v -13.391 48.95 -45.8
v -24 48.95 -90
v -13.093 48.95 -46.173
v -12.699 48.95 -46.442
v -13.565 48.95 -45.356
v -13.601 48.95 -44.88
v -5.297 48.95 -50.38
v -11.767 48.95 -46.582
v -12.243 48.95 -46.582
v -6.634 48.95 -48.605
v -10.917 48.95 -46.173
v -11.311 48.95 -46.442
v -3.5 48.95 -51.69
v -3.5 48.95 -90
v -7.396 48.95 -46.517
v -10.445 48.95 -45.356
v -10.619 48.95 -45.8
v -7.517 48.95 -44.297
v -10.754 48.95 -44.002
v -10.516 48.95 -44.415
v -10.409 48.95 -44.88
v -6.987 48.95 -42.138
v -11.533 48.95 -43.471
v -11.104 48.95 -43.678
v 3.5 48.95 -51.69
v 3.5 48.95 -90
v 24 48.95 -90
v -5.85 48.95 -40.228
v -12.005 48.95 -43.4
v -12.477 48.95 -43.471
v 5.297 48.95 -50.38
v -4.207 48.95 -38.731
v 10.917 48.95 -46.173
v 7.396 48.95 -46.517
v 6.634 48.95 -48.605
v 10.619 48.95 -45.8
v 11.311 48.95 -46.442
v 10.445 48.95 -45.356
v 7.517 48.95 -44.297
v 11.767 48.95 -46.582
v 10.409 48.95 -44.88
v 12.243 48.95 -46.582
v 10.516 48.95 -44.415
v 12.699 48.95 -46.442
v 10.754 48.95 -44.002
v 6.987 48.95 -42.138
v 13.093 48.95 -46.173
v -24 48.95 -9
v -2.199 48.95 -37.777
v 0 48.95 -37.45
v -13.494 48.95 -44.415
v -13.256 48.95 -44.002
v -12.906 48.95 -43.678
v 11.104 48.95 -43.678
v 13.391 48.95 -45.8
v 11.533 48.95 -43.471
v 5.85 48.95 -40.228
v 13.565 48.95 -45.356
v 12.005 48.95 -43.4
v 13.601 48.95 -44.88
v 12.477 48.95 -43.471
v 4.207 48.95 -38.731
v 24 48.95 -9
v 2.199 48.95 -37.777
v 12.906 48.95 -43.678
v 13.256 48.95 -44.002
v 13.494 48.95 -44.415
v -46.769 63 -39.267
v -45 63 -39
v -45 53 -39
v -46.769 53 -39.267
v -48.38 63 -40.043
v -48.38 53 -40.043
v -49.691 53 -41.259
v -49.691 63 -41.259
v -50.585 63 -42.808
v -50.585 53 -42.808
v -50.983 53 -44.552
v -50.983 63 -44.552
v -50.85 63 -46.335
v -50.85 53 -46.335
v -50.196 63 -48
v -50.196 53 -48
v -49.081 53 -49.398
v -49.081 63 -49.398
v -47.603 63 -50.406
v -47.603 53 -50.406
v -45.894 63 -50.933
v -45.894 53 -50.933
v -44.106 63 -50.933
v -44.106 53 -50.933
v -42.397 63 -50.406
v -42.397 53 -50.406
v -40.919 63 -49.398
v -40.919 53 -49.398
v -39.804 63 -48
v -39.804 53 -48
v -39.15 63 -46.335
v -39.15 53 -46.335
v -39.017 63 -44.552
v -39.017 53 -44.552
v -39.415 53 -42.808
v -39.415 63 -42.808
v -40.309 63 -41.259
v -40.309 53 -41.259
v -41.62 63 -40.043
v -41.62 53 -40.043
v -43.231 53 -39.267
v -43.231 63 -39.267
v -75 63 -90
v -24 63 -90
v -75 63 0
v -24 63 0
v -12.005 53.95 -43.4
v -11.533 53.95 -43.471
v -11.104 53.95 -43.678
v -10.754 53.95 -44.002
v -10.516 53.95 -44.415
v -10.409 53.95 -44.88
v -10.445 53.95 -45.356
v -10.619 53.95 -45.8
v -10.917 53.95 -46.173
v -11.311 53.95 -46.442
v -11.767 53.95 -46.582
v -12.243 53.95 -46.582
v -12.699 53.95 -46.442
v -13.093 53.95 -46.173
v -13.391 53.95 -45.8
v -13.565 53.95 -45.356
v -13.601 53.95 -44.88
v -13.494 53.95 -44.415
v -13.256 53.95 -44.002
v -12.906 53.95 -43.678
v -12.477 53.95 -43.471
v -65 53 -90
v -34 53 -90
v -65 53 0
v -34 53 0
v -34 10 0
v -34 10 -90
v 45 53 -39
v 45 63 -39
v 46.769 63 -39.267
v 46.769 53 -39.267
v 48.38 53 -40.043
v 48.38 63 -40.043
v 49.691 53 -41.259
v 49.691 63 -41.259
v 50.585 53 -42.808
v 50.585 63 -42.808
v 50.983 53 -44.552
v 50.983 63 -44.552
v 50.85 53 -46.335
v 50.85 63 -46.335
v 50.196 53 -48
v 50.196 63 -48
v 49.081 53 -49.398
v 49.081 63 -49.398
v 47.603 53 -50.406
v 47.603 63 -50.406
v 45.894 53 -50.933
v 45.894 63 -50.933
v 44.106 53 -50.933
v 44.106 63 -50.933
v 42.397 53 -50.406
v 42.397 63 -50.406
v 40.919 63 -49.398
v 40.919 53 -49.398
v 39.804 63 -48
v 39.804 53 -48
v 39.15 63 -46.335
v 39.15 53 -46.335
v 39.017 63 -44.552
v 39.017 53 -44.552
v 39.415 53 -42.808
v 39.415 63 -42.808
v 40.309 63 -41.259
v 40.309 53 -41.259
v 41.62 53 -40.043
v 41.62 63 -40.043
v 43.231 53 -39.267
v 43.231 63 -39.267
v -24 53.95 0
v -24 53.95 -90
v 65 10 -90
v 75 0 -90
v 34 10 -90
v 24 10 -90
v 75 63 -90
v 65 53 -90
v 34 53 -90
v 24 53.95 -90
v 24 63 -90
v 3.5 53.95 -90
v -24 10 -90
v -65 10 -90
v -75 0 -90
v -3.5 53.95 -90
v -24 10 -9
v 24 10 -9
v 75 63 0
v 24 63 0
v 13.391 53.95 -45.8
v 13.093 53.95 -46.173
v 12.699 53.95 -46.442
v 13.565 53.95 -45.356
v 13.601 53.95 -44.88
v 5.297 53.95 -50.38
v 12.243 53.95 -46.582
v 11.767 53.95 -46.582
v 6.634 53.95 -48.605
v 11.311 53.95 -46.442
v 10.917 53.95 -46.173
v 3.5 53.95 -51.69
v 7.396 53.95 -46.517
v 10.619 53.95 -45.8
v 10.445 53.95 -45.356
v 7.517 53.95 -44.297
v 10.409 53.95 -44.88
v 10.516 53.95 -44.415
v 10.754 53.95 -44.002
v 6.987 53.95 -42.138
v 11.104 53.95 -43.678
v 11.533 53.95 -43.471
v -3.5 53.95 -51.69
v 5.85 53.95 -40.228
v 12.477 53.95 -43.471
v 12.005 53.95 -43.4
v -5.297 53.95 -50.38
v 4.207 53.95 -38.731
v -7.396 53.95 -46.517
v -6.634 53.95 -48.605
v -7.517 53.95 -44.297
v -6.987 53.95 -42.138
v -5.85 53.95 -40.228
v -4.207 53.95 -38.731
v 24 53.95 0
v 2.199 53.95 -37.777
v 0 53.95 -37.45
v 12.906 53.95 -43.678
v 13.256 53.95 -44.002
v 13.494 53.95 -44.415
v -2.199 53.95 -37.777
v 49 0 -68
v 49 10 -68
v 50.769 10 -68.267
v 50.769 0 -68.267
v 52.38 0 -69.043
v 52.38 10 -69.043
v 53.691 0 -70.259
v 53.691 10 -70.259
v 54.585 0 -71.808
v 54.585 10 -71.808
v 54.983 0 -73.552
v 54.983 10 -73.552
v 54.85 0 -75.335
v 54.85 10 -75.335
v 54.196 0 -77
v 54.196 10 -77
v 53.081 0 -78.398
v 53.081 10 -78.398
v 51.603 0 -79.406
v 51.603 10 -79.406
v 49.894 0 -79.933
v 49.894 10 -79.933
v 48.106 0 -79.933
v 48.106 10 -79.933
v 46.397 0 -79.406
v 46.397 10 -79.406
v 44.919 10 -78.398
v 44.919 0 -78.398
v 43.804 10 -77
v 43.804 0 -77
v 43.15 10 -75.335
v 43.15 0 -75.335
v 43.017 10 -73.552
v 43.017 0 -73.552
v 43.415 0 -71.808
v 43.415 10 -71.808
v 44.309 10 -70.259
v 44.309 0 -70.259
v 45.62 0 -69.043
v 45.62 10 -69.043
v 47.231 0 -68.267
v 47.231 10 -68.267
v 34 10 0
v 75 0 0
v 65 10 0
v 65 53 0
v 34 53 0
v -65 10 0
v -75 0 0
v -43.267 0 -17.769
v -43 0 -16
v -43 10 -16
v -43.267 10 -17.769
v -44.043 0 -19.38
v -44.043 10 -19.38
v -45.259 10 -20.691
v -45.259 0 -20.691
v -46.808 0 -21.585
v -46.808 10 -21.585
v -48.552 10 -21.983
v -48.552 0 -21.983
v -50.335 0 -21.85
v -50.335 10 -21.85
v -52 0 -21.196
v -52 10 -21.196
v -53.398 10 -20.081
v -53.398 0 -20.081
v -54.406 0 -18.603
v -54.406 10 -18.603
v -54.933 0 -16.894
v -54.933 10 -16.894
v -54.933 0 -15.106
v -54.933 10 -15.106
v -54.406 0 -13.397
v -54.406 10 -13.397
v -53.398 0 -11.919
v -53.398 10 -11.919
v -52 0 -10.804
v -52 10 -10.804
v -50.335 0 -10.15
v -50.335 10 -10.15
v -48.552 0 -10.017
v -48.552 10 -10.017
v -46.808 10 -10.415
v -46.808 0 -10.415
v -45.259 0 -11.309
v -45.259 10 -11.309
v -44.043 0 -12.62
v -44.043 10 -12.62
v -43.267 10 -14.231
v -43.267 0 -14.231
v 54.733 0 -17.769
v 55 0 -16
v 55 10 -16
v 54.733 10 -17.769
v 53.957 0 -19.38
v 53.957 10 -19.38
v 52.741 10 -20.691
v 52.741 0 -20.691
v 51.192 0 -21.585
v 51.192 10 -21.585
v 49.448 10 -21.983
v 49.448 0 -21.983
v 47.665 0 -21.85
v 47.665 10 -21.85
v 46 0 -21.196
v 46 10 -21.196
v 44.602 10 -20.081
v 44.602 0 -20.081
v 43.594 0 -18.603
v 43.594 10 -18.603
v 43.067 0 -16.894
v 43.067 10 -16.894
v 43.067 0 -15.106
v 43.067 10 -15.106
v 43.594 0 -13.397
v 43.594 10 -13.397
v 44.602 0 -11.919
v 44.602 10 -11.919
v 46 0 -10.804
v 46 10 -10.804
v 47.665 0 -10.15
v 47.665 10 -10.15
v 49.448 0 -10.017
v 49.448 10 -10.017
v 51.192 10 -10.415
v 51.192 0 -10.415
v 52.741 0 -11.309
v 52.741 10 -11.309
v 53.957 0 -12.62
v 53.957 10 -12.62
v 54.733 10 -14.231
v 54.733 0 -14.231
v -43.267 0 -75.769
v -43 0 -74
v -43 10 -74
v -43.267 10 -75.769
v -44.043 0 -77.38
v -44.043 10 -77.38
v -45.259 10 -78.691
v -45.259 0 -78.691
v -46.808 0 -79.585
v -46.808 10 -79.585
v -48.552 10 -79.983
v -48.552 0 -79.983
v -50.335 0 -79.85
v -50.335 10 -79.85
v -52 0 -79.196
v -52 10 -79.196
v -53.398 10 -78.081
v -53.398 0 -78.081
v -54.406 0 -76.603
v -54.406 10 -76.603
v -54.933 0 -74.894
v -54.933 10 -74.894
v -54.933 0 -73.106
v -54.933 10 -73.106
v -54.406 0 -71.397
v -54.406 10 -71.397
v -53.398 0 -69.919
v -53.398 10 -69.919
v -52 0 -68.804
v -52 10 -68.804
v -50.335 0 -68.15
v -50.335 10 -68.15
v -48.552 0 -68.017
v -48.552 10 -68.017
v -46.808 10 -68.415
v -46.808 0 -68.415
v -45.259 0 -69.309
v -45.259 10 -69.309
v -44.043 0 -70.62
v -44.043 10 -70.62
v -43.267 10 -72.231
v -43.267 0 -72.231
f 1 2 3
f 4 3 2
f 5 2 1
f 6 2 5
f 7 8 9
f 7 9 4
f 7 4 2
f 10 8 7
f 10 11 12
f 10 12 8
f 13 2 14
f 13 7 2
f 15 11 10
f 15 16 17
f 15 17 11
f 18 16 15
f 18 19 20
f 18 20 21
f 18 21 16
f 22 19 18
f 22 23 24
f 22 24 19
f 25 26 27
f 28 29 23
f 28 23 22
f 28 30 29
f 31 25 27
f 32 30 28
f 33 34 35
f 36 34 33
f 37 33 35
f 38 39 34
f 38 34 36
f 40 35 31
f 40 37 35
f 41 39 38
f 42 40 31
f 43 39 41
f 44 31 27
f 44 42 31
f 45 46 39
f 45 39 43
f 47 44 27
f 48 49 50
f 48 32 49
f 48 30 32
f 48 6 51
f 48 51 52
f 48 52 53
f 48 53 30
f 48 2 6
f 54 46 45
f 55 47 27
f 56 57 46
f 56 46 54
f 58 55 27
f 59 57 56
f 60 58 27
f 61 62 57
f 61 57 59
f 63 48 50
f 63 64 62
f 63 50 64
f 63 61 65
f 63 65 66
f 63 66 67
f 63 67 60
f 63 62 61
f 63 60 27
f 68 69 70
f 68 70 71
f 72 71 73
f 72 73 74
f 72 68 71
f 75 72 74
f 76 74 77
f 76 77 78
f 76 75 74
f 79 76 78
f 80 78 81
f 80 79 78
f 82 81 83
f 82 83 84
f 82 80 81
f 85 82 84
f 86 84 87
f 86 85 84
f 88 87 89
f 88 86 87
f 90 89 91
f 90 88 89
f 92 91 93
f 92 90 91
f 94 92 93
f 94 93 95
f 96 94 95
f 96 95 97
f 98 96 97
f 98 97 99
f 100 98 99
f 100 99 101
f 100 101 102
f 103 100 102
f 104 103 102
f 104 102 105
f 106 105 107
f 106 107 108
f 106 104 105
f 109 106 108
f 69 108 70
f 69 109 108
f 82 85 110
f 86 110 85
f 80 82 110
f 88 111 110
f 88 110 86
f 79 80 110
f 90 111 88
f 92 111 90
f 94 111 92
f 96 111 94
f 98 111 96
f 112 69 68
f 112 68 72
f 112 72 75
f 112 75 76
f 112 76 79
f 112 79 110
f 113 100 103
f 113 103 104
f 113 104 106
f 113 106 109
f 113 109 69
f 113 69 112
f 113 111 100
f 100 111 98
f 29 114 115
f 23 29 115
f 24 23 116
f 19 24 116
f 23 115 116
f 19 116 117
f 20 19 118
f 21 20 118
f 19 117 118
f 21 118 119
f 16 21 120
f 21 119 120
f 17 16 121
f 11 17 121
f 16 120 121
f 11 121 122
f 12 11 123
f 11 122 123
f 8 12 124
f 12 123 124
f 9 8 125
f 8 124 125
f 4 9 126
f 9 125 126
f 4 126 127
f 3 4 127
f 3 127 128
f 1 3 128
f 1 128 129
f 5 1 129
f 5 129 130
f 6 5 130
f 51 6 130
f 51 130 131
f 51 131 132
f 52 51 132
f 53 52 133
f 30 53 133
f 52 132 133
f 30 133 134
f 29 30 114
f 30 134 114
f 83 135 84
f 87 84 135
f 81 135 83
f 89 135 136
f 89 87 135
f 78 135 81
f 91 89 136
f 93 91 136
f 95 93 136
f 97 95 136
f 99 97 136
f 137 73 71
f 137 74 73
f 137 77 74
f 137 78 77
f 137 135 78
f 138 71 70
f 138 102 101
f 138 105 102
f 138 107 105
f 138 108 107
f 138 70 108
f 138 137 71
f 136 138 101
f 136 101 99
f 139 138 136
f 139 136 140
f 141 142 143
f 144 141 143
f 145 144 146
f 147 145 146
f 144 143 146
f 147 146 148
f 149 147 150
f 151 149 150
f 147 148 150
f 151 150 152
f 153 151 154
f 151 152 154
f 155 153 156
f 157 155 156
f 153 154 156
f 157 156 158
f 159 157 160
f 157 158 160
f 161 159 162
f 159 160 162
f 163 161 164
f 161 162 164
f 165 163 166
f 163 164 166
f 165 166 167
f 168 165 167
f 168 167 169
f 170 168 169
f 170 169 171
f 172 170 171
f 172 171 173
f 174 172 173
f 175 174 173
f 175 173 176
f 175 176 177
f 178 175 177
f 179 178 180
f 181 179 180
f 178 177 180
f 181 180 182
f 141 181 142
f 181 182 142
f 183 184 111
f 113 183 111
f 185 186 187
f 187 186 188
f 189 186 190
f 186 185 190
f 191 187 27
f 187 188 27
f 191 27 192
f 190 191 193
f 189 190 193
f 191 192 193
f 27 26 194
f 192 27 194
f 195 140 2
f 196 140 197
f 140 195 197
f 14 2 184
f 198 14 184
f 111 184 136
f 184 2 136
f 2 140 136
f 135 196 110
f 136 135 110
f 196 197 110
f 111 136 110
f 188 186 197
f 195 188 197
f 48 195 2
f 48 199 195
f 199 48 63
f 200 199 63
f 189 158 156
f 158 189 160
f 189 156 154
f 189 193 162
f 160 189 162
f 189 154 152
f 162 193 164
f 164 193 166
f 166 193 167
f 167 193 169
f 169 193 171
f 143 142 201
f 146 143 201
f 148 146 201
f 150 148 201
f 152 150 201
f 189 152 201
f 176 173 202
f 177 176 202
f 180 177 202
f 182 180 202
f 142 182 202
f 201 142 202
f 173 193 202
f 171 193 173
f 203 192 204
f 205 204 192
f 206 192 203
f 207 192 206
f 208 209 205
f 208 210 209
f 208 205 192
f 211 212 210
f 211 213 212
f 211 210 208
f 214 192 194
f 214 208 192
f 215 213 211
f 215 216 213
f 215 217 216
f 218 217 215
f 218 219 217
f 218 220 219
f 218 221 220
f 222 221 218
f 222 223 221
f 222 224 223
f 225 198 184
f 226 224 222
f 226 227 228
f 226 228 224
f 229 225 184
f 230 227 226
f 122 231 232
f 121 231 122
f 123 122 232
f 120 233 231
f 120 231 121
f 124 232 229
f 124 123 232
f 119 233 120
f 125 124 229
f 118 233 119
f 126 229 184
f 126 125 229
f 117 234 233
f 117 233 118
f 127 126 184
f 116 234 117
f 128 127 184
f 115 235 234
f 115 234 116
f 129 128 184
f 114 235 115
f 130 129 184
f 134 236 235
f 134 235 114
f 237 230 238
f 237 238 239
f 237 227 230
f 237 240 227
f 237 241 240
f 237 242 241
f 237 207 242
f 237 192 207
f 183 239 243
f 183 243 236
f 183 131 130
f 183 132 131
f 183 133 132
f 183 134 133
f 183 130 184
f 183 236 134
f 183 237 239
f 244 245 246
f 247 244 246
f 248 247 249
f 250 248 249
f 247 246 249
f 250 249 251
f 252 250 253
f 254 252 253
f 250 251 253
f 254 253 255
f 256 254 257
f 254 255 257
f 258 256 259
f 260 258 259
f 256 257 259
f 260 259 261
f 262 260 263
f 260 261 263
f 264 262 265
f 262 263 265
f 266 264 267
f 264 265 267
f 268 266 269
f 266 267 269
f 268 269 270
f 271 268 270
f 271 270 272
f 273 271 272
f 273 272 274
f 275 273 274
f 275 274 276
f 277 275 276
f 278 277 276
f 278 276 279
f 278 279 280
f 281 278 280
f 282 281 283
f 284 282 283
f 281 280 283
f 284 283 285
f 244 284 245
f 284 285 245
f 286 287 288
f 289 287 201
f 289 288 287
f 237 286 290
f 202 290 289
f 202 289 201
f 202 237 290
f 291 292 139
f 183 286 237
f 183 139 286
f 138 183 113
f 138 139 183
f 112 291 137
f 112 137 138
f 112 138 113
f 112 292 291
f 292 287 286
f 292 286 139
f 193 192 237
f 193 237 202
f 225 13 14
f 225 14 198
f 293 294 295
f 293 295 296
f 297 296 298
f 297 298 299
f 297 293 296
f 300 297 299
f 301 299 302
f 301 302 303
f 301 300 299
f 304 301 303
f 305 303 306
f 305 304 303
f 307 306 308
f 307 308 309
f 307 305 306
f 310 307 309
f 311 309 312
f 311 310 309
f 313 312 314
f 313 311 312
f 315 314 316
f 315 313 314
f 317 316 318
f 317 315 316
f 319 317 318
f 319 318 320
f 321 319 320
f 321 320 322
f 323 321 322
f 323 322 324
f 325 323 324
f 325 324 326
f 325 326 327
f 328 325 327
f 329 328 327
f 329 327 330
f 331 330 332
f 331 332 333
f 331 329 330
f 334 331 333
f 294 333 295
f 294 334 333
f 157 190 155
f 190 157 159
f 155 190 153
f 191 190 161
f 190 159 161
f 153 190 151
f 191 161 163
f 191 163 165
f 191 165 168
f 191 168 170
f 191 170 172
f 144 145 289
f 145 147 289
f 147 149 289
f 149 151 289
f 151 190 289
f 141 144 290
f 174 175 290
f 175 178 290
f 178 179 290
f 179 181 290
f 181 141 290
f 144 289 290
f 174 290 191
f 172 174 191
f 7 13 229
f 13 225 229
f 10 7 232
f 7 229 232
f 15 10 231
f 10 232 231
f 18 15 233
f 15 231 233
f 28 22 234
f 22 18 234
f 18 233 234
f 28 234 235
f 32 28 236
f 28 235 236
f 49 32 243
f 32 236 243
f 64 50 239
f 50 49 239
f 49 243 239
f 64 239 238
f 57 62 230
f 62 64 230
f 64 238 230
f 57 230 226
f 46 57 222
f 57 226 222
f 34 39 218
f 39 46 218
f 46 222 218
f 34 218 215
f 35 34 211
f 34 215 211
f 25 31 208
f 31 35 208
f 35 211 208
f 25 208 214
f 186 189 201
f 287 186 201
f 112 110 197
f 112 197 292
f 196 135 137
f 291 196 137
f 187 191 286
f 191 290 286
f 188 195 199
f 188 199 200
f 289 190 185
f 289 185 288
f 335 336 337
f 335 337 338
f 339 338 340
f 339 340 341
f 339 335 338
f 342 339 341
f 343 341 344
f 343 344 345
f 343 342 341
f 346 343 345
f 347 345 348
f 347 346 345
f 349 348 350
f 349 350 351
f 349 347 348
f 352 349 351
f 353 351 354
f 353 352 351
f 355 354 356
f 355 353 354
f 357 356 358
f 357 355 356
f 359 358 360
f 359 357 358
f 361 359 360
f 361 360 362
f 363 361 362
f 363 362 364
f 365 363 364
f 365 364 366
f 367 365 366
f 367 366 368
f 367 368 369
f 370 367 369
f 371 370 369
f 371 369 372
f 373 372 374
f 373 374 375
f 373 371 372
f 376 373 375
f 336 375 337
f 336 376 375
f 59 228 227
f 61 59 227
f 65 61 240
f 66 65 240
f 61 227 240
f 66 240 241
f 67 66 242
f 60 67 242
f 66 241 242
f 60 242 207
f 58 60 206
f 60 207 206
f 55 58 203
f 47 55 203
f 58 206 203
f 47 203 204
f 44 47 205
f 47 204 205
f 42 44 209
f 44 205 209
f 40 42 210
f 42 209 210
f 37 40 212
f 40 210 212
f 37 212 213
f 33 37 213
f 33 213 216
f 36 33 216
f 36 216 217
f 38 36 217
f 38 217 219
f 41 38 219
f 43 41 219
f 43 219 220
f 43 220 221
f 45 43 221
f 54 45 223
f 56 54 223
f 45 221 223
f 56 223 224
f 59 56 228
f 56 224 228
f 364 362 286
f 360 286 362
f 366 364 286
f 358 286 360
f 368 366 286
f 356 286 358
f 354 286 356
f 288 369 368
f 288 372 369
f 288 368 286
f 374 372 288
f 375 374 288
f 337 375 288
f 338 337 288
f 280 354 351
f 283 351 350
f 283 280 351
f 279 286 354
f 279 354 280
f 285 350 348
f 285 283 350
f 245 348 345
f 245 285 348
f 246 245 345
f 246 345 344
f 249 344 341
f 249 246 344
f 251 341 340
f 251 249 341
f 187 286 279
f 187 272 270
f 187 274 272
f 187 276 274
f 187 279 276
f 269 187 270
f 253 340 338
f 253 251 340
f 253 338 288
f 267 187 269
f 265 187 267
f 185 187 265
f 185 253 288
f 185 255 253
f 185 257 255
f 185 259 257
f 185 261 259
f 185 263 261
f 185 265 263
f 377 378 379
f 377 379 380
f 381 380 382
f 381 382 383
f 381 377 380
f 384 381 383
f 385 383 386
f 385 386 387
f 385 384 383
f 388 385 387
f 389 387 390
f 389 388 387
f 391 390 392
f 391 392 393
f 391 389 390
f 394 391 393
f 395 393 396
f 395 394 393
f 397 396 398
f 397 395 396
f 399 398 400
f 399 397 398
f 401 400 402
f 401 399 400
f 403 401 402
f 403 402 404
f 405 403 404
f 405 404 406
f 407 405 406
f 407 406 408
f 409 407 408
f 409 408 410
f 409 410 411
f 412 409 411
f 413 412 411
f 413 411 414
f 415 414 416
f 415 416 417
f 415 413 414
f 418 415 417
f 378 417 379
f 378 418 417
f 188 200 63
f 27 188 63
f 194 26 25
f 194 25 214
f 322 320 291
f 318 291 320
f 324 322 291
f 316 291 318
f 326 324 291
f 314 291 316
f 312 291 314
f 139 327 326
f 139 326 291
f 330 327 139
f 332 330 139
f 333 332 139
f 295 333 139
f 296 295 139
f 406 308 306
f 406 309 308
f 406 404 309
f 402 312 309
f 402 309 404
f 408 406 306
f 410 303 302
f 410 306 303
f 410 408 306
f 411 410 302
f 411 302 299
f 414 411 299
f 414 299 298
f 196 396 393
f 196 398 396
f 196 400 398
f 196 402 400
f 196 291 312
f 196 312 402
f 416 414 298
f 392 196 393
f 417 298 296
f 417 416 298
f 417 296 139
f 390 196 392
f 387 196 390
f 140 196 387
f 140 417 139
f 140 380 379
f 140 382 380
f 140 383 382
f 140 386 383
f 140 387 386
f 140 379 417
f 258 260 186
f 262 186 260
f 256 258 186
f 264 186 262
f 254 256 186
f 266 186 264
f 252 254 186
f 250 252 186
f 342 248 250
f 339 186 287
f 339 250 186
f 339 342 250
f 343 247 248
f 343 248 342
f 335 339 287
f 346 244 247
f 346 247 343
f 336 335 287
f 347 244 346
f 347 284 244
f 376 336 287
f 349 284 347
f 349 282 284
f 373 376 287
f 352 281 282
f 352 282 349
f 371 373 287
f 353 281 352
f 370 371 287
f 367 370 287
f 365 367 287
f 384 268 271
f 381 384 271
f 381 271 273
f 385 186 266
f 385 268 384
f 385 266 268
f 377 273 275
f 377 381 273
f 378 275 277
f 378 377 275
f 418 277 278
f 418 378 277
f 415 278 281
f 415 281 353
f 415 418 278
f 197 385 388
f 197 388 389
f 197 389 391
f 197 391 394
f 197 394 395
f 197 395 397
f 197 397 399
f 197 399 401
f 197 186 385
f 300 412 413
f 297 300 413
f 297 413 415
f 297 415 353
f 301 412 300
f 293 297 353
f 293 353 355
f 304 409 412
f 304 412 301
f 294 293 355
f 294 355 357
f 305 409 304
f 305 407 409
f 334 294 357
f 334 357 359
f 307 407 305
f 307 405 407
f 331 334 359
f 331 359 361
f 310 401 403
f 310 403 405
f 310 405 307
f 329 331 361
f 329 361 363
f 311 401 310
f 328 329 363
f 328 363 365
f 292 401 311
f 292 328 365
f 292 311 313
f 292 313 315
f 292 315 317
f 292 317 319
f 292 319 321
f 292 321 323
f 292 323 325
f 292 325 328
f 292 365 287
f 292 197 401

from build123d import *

# Parameters (mm, degrees)
SKETCH2_W           = 130
SKETCH2_H           = 90
BOSS_EXTRUDE1_DEPTH = 10
SKETCH3_W           = 42
SKETCH3_H           = 72
BOSS_EXTRUDE3_DEPTH = 53
SKETCH4_W           = 32
SKETCH4_H           = 43
CUT_EXTRUDE1_DEPTH  = 72
SKETCH5_R           = 6
CUT_EXTRUDE2_DEPTH  = 10
SKETCH6_W           = 72
SKETCH6_H           = 5
BOSS_EXTRUDE4_DEPTH = 48
SKETCH7_R           = 7.55
SKETCH7_R_2         = 1.6
CUT_EXTRUDE3_DEPTH  = 5
SKETCH8_R           = 6
CUT_EXTRUDE4_DEPTH  = 10
MIRROR2_OUTLINE_R   = 6
MIRROR2_DEPTH       = 10
SKETCH9_W           = 68
SKETCH9_H           = 43.95
BOSS_EXTRUDE5_DEPTH = 9
SKETCH10_W          = 7
SKETCH10_H          = 36
CUT_EXTRUDE5_DEPTH  = 5
BOSS_EXTRUDE6_DEPTH = 9
BOSS_EXTRUDE7_DEPTH = 9
SKETCH13_W          = 90
SKETCH13_H          = 63
BOSS_EXTRUDE8_DEPTH = 10


# Read off the part's stored shape, not the designer's step: Mirror2
with BuildPart() as part:
    # Sketch2 → Boss-Extrude1 (new body)
    with BuildSketch(Plane(origin=(0, 0, 0), x_dir=(1, 0, 0), z_dir=(0, 1, 0))):
        with Locations((0, 45)):
            Rectangle(SKETCH2_W, SKETCH2_H)
    extrude(amount=BOSS_EXTRUDE1_DEPTH)

    # Sketch3 → Boss-Extrude3 (add)
    with BuildSketch(Plane(origin=(0, 10, 0), x_dir=(1, 0, 0), z_dir=(0, 1, 0))):
        with Locations((45, 45)):
            Rectangle(SKETCH3_W, SKETCH3_H)
    boss_extrude3 = extrude(amount=BOSS_EXTRUDE3_DEPTH)

    # Sketch4 → Cut-Extrude1 (cut)
    with BuildSketch(Plane.XY.offset(-9)):
        with Locations((50, 31.5)):
            Rectangle(SKETCH4_W, SKETCH4_H)
    cut_extrude1 = extrude(amount=-CUT_EXTRUDE1_DEPTH, mode=Mode.SUBTRACT)

    # Sketch5 → Cut-Extrude2 (cut)
    with BuildSketch(Plane(origin=(0, 63, 0), x_dir=(1, 0, 0), z_dir=(0, 1, 0))):
        with Locations(Location((45, 45, 0), (0, 0, 270))):
            Circle(SKETCH5_R)
    cut_extrude2 = extrude(amount=-CUT_EXTRUDE2_DEPTH, mode=Mode.SUBTRACT)

    # Mirror1: Boss-Extrude3, Cut-Extrude1, Cut-Extrude2 across Right Plane
    add(boss_extrude3.mirror(Plane(origin=(0, 0, 0), x_dir=(0, 0, -1), z_dir=(1, 0, 0))))
    add(cut_extrude1.mirror(Plane(origin=(0, 0, 0), x_dir=(0, 0, -1), z_dir=(1, 0, 0))), mode=Mode.SUBTRACT)
    add(cut_extrude2.mirror(Plane(origin=(0, 0, 0), x_dir=(0, 0, -1), z_dir=(1, 0, 0))), mode=Mode.SUBTRACT)

    # Sketch6 → Boss-Extrude4 (add)
    with BuildSketch(Plane.ZY.offset(-24)):
        with Locations((-45, 51.45)):
            Rectangle(SKETCH6_W, SKETCH6_H)
    extrude(amount=BOSS_EXTRUDE4_DEPTH)

    # Sketch7 → Cut-Extrude3 (cut)
    with BuildSketch(Plane(origin=(0, 53.95, 0), x_dir=(1, 0, 0), z_dir=(0, 1, 0))):
        with Locations(Location((0, 45, 0), (0, 0, 270))):
            Circle(SKETCH7_R)
        with Locations(Location((12.005, 45, 0), (0, 0, 270))):
            Circle(SKETCH7_R_2)
        with Locations(Location((-12.005, 45, 0), (0, 0, 270))):
            Circle(SKETCH7_R_2)
    extrude(amount=-CUT_EXTRUDE3_DEPTH, mode=Mode.SUBTRACT)

    # Sketch8 → Cut-Extrude4 (cut)
    with BuildSketch(Plane(origin=(0, 10, 0), x_dir=(1, 0, 0), z_dir=(0, 1, 0))):
        with Locations(Location((49, 74, 0), (0, 0, 270))):
            Circle(SKETCH8_R)
    extrude(amount=-CUT_EXTRUDE4_DEPTH, mode=Mode.SUBTRACT)

    # Mirror2 outline → Mirror2 (cut)
    with BuildSketch(Plane(origin=(0, 0, 0), x_dir=(1, 0, 0), z_dir=(0, 1, 0))):
        with Locations((49, 16)):
            Circle(MIRROR2_OUTLINE_R)
        with Locations((-49, 74)):
            Circle(MIRROR2_OUTLINE_R)
        with Locations((-49, 16)):
            Circle(MIRROR2_OUTLINE_R)
    extrude(amount=MIRROR2_DEPTH, mode=Mode.SUBTRACT)

    # Sketch9 → Boss-Extrude5 (add)
    with BuildSketch(Plane.XY.offset(-9)):
        with Locations((0, 31.975)):
            Rectangle(SKETCH9_W, SKETCH9_H)
    extrude(amount=BOSS_EXTRUDE5_DEPTH)

    # Sketch10 → Cut-Extrude5 (cut)
    with BuildSketch(Plane(origin=(0, 53.95, 0), x_dir=(1, 0, 0), z_dir=(0, 1, 0))):
        with Locations((0, 63)):
            Rectangle(SKETCH10_W, SKETCH10_H)
    extrude(amount=-CUT_EXTRUDE5_DEPTH, mode=Mode.SUBTRACT)

    # Sketch11 → Boss-Extrude6 (add)
    with BuildSketch(Plane.XY.offset(-9)):
        Polygon((-66, 63), (-66, 53), (-34, 53), (-34, 53.95), (-24, 53.95), (-24, 63), align=None)
    boss_extrude6 = extrude(amount=BOSS_EXTRUDE6_DEPTH)

    # Mirror3: Boss-Extrude6 across Right Plane
    add(boss_extrude6.mirror(Plane(origin=(0, 0, 0), x_dir=(0, 0, -1), z_dir=(1, 0, 0))))

    # Sketch12 → Boss-Extrude7 (add)
    with BuildSketch(Plane(origin=(0, 0, -81), x_dir=(-1, 0, 0), z_dir=(0, 0, -1))):
        Polygon((-66, 63), (-66, 53), (-34, 53), (-34, 10), (-24, 10), (-24, 48.95), (-3.5, 48.95), (-3.5, 53.95), (-24, 53.95), (-24, 63), align=None)
    boss_extrude7 = extrude(amount=BOSS_EXTRUDE7_DEPTH)

    # Mirror4: Boss-Extrude7 across Right Plane
    add(boss_extrude7.mirror(Plane(origin=(0, 0, 0), x_dir=(0, 0, -1), z_dir=(1, 0, 0))))

    # Sketch13 → Boss-Extrude8 (add)
    with BuildSketch(Plane.ZY.offset(65)):
        with Locations((-45, 31.5)):
            Rectangle(SKETCH13_W, SKETCH13_H)
    boss_extrude8 = extrude(amount=BOSS_EXTRUDE8_DEPTH)

    # Mirror5: Boss-Extrude8 across Right Plane
    add(boss_extrude8.mirror(Plane(origin=(0, 0, 0), x_dir=(0, 0, -1), z_dir=(1, 0, 0))))


solid = part.part
